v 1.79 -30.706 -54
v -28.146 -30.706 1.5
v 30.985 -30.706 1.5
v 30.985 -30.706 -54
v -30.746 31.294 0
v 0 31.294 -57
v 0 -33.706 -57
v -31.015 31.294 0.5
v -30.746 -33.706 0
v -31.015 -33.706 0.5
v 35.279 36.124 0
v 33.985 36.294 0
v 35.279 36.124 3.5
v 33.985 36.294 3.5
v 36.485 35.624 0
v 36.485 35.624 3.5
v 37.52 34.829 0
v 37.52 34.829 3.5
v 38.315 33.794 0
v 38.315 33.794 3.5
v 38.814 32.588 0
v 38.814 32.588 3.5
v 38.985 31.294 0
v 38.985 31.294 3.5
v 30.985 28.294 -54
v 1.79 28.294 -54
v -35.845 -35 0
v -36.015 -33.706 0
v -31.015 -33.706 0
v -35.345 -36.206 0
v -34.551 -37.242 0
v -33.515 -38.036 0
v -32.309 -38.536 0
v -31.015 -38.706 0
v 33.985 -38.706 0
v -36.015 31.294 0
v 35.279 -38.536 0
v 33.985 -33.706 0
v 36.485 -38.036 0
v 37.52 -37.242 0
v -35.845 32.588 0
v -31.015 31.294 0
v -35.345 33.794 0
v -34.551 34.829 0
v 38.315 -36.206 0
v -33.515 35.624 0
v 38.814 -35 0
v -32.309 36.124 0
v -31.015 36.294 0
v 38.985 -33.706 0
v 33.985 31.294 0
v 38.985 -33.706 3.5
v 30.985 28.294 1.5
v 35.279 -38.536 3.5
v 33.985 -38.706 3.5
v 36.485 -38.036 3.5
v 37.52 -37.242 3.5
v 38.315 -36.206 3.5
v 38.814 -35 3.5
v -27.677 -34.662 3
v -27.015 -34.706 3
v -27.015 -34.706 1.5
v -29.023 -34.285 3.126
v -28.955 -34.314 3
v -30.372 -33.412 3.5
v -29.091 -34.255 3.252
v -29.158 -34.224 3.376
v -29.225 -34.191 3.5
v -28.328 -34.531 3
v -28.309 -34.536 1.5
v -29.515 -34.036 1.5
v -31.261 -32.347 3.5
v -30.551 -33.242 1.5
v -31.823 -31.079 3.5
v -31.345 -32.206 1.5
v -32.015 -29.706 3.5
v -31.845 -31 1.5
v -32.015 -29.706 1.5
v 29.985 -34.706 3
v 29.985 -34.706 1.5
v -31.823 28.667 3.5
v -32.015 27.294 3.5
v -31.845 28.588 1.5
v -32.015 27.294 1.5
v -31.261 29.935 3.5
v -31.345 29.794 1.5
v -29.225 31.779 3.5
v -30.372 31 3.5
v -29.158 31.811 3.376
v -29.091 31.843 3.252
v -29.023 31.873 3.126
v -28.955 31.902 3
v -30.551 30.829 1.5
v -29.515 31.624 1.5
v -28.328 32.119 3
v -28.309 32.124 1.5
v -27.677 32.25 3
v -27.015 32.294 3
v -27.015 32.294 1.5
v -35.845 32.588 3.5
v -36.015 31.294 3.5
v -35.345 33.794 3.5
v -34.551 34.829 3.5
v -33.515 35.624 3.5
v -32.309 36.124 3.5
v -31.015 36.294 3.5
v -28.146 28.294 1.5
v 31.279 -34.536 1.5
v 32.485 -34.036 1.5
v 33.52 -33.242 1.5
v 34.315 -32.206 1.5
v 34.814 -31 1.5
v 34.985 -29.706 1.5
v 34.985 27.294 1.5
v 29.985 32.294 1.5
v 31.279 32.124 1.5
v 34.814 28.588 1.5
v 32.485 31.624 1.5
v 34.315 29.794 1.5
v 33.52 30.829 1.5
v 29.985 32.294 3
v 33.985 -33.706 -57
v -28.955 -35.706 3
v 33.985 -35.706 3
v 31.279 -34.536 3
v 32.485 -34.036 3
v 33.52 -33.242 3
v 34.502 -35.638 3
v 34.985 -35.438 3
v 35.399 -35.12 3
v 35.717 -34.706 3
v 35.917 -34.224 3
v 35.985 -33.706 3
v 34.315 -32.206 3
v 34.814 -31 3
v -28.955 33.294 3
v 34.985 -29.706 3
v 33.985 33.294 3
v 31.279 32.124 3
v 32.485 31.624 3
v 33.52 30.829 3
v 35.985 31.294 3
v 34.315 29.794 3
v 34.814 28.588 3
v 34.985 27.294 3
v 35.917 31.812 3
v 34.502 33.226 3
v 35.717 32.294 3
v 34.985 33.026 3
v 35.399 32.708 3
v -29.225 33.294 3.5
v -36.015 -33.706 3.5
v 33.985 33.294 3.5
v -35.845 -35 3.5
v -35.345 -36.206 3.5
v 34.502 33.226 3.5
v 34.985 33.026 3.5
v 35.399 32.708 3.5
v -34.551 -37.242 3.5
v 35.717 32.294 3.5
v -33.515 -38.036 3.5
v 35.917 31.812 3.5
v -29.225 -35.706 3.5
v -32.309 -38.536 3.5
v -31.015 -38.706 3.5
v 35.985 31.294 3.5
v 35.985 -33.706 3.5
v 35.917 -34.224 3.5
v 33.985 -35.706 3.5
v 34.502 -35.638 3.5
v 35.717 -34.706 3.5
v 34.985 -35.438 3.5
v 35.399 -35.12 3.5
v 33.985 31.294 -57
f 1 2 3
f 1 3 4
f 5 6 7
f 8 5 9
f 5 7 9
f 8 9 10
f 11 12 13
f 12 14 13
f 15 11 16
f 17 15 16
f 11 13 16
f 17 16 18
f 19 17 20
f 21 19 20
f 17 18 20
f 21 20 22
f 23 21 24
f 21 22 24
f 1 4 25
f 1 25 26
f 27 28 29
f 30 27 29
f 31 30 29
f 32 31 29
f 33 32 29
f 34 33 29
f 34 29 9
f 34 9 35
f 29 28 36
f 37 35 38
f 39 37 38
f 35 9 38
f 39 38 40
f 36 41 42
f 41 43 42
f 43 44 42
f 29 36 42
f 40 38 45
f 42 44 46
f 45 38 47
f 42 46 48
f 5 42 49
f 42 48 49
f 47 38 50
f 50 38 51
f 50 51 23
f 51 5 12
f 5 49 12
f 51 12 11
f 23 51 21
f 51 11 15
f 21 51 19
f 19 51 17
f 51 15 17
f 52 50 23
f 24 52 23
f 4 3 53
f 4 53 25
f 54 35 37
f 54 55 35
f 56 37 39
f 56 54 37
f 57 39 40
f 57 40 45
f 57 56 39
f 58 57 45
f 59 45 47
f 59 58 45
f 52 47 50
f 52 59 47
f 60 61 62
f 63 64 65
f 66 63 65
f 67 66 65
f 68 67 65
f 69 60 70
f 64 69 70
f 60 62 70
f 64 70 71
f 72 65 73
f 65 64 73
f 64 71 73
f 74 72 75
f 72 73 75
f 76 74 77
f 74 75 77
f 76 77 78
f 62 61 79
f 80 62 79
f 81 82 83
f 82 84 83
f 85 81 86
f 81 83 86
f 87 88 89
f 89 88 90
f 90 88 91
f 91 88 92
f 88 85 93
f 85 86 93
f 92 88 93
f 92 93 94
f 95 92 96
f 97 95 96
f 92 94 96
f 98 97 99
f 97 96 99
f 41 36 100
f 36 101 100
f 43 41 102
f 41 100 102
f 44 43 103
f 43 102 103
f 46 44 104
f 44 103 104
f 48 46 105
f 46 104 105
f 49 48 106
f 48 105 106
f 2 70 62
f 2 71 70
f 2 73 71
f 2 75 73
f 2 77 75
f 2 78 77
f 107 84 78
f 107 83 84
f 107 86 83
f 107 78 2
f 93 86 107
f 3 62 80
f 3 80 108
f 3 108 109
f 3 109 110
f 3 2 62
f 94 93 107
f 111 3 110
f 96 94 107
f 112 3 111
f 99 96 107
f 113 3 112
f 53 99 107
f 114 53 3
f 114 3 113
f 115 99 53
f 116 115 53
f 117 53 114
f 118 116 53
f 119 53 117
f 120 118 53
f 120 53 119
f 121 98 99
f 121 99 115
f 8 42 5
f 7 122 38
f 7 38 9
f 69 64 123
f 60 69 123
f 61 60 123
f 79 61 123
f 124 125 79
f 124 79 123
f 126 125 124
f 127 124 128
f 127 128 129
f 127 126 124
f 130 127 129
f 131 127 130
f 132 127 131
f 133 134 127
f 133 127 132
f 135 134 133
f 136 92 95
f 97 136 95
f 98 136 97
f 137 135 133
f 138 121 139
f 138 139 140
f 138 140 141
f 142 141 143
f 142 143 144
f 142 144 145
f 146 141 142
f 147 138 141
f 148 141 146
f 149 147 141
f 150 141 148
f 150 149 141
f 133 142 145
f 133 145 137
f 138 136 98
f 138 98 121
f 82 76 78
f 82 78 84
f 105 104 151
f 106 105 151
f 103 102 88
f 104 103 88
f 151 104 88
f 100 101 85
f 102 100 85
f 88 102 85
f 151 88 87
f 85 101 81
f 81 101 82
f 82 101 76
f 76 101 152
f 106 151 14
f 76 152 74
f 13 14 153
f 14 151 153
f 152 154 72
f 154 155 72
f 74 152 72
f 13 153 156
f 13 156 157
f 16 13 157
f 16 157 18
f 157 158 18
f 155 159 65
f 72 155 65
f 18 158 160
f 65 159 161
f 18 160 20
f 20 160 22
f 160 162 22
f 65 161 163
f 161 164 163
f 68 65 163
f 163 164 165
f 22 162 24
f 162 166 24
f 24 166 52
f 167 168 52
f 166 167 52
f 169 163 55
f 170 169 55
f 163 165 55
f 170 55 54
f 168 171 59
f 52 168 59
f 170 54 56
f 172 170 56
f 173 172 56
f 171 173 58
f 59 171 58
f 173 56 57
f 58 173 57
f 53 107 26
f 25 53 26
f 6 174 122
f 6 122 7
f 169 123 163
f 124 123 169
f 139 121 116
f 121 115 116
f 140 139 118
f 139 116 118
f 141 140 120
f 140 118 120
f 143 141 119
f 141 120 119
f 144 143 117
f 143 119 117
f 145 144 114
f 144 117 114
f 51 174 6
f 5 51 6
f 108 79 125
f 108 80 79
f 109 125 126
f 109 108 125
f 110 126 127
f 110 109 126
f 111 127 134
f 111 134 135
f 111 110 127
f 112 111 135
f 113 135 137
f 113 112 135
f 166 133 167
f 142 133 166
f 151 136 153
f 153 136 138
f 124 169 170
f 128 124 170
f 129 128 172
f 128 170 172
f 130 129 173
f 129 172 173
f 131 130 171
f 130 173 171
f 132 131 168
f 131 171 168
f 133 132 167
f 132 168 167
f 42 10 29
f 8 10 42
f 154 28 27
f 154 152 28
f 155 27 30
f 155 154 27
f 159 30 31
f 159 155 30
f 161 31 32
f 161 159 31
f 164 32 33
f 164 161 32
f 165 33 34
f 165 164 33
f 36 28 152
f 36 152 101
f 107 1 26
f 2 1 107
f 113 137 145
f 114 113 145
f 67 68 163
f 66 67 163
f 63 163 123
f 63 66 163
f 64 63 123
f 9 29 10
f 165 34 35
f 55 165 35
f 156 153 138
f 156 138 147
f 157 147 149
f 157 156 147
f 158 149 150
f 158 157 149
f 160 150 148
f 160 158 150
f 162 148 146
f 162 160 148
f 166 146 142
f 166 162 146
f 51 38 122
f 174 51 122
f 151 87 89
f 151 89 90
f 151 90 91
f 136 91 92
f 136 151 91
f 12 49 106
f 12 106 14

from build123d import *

# Parameters (mm, degrees)
F0_W        = 75
F0_H        = 75
F1_DEPTH    = 3.5
F2_W        = 65
F2_H        = 65
F3_DEPTH    = 3.5
F4_R        = 5
F6_DEPTH    = 65
F7_T        = 3
F7_T3_DEPTH = 70.7303019134
F7_T5_DEPTH = 71
F7_T7_DEPTH = 6.5680995141
F7_T9_DEPTH = 6.5
F8_W        = 67
F8_H        = 67
F9_DEPTH    = 2
F10_R       = 5


# Not quite as in the source:
# - a shell that OpenCascade refuses in one call is made with other operations: the cavity is built on its own and cut out


with BuildPart() as f1:
    # F0 (on Top) → F1 (new body)
    with BuildSketch(Plane.XY):
        with Locations((1.4847200364, -1.2060580678)):
            Rectangle(F0_W, F0_H)
    extrude(amount=F1_DEPTH)

    # F2 (on face) → F3 (cut)
    with BuildSketch(Plane.XY.offset(3.5)):
        with Locations((1.4847200364, -1.2060580678)):
            Rectangle(F2_W, F2_H)
    extrude(amount=-F3_DEPTH, mode=Mode.SUBTRACT)

    # F4
    f4_edges = [f1.edges().sort_by_distance(p)[0] for p in [
        (38.98472, -38.706058, 1.75),
        (-36.01528, -38.706058, 1.75),
        (38.98472, 36.293942, 1.75),
        (-36.01528, 36.293942, 1.75),
    ]]
    fillet(f4_edges, radius=F4_R)

    # F5 (on face) → F6 (join)
    with BuildSketch(Plane(origin=(0, -33.7060580678, 0), x_dir=(-1, 0, 0), z_dir=(0, 1, 0))):
        Polygon((31.0152799636, 3.5), (-33.9847200364, 3.5), (-33.9847200364, -57), (0, -57), (31.0152799636, 0.5), align=None)
    extrude(amount=F6_DEPTH)

    # F7: shell of thickness 3, made by hand


with BuildPart() as f7_core1:
    # F7_t2: copy of F1
    add(f1.part)

    # the walls: a layer under each face that stays
    f7_faces = [f7_core1.faces().sort_by_distance(p)[0] for p in [
        (1.4847200364, 36.2939419322, 1.75),
        (-33.5152799636, -36.2060580678, 0),
        (37.5202539423, 34.8294758382, 1.75),
        (-34.5508138695, 34.8294758382, 1.75),
        (38.9847200364, -1.2060580678, 1.75),
        (-36.0152799636, -1.2060580678, 1.75),
        (37.5202539423, -37.2415919737, 1.75),
        (-34.5508138695, -37.2415919737, 1.75),
        (1.4847200364, -38.7060580678, 1.75),
        (-30.9703302825, -33.7060580678, 0.0833333333),
        (1.6195690797, -33.7060580678, -28.5),
        (33.9847200364, -1.2060580678, -28.5),
        (1.6195690797, 31.2939419322, -28.5),
        (-30.8804309203, 31.2939419322, 0.0833333333),
        (-31.0152799636, -1.2060580678, 0.25),
        (-15.5076399818, -1.2060580678, -28.25),
        (16.9923600182, -1.2060580678, -57),
    ]]
    thicken(f7_faces, amount=-F7_T, mode=Mode.SUBTRACT)

    # F7_s4 → F7_t3 (cut)
    with BuildSketch(Plane.YZ.offset(-33.745581877)):
        Polygon((-33.7360580678, -0.03), (-33.7060580678, 3), (-30.7060580678, 3), (-30.7060580678, 0), align=None)
        Polygon((31.3239419322, -0.03), (31.2939419322, 3), (28.2939419322, 3), (28.2939419322, 0), align=None)
    extrude(amount=F7_T3_DEPTH, mode=Mode.SUBTRACT)

    # F7_s6 → F7_t5 (cut)
    with BuildSketch(Plane.XZ.offset(-34.2939419322)):
        Polygon((34.0147200364, -0.03), (33.9847200364, 3), (30.9847200364, 3), (30.9847200364, 0), align=None)
        Polygon((-31.0116837883, 0.485757878), (-34.0152799636, 0.5), (-34.0152799636, 12.3810577497), (-28.3748974906, 1.9242122019), align=None)
    extrude(amount=F7_T5_DEPTH, mode=Mode.SUBTRACT)

    # F7_s8 → F7_t7 (cut)
    with BuildSketch(Plane(origin=(-5.5050917478, 0, 10.2060267027), x_dir=(0, 1, 0), z_dir=(-0.4747374006, 0, 0.880127491))):
        Polygon((-33.6760580678, 27.0900318369), (-36.7060580678, 27.0600318369), (-36.7060580678, 24.0600318369), (-33.7060580678, 24.0600318369), align=None)
        Polygon((31.2639419322, 27.0900318369), (34.2939419322, 27.0600318369), (34.2939419322, 24.0600318369), (31.2939419322, 24.0600318369), align=None)
    extrude(amount=F7_T7_DEPTH, mode=Mode.SUBTRACT)

    # F7_s10 → F7_t9 (cut)
    with BuildSketch(Plane.XY.offset(-3)):
        Polygon((-30.9852799636, -33.6760580678), (-31.0152799636, -36.7060580678), (-34.0152799636, -36.7060580678), (-34.0152799636, -33.7060580678), align=None)
        Polygon((-30.9852799636, 31.2639419322), (-31.0152799636, 34.2939419322), (-34.0152799636, 34.2939419322), (-34.0152799636, 31.2939419322), align=None)
    extrude(amount=F7_T9_DEPTH, mode=Mode.SUBTRACT)


with BuildPart() as f1_1:
    add(f1.part)

    # what is left inside the walls is the cavity
    f7_cavity = [f7_core1.part.solids().sort_by_distance(p)[0] for p in [
        (3.379924, -12.706058, 3.47),
    ]]
    add(f7_cavity, mode=Mode.SUBTRACT)

    # F8 (on face) → F9 (cut)
    with BuildSketch(Plane.XY.offset(3.5)):
        with Locations((1.4847200364, -1.2060580678)):
            Rectangle(F8_W, F8_H)
    extrude(amount=-F9_DEPTH, mode=Mode.SUBTRACT)

    # F10
    f10_edges = [f1_1.edges().sort_by_distance(p)[0] for p in [
        (-32.01528, 32.293942, 2.5),
        (34.98472, 32.293942, 2.25),
        (-32.01528, -34.706058, 2.5),
        (34.98472, -34.706058, 2.25),
    ]]
    fillet(f10_edges, radius=F10_R)


solid = f1_1.part
